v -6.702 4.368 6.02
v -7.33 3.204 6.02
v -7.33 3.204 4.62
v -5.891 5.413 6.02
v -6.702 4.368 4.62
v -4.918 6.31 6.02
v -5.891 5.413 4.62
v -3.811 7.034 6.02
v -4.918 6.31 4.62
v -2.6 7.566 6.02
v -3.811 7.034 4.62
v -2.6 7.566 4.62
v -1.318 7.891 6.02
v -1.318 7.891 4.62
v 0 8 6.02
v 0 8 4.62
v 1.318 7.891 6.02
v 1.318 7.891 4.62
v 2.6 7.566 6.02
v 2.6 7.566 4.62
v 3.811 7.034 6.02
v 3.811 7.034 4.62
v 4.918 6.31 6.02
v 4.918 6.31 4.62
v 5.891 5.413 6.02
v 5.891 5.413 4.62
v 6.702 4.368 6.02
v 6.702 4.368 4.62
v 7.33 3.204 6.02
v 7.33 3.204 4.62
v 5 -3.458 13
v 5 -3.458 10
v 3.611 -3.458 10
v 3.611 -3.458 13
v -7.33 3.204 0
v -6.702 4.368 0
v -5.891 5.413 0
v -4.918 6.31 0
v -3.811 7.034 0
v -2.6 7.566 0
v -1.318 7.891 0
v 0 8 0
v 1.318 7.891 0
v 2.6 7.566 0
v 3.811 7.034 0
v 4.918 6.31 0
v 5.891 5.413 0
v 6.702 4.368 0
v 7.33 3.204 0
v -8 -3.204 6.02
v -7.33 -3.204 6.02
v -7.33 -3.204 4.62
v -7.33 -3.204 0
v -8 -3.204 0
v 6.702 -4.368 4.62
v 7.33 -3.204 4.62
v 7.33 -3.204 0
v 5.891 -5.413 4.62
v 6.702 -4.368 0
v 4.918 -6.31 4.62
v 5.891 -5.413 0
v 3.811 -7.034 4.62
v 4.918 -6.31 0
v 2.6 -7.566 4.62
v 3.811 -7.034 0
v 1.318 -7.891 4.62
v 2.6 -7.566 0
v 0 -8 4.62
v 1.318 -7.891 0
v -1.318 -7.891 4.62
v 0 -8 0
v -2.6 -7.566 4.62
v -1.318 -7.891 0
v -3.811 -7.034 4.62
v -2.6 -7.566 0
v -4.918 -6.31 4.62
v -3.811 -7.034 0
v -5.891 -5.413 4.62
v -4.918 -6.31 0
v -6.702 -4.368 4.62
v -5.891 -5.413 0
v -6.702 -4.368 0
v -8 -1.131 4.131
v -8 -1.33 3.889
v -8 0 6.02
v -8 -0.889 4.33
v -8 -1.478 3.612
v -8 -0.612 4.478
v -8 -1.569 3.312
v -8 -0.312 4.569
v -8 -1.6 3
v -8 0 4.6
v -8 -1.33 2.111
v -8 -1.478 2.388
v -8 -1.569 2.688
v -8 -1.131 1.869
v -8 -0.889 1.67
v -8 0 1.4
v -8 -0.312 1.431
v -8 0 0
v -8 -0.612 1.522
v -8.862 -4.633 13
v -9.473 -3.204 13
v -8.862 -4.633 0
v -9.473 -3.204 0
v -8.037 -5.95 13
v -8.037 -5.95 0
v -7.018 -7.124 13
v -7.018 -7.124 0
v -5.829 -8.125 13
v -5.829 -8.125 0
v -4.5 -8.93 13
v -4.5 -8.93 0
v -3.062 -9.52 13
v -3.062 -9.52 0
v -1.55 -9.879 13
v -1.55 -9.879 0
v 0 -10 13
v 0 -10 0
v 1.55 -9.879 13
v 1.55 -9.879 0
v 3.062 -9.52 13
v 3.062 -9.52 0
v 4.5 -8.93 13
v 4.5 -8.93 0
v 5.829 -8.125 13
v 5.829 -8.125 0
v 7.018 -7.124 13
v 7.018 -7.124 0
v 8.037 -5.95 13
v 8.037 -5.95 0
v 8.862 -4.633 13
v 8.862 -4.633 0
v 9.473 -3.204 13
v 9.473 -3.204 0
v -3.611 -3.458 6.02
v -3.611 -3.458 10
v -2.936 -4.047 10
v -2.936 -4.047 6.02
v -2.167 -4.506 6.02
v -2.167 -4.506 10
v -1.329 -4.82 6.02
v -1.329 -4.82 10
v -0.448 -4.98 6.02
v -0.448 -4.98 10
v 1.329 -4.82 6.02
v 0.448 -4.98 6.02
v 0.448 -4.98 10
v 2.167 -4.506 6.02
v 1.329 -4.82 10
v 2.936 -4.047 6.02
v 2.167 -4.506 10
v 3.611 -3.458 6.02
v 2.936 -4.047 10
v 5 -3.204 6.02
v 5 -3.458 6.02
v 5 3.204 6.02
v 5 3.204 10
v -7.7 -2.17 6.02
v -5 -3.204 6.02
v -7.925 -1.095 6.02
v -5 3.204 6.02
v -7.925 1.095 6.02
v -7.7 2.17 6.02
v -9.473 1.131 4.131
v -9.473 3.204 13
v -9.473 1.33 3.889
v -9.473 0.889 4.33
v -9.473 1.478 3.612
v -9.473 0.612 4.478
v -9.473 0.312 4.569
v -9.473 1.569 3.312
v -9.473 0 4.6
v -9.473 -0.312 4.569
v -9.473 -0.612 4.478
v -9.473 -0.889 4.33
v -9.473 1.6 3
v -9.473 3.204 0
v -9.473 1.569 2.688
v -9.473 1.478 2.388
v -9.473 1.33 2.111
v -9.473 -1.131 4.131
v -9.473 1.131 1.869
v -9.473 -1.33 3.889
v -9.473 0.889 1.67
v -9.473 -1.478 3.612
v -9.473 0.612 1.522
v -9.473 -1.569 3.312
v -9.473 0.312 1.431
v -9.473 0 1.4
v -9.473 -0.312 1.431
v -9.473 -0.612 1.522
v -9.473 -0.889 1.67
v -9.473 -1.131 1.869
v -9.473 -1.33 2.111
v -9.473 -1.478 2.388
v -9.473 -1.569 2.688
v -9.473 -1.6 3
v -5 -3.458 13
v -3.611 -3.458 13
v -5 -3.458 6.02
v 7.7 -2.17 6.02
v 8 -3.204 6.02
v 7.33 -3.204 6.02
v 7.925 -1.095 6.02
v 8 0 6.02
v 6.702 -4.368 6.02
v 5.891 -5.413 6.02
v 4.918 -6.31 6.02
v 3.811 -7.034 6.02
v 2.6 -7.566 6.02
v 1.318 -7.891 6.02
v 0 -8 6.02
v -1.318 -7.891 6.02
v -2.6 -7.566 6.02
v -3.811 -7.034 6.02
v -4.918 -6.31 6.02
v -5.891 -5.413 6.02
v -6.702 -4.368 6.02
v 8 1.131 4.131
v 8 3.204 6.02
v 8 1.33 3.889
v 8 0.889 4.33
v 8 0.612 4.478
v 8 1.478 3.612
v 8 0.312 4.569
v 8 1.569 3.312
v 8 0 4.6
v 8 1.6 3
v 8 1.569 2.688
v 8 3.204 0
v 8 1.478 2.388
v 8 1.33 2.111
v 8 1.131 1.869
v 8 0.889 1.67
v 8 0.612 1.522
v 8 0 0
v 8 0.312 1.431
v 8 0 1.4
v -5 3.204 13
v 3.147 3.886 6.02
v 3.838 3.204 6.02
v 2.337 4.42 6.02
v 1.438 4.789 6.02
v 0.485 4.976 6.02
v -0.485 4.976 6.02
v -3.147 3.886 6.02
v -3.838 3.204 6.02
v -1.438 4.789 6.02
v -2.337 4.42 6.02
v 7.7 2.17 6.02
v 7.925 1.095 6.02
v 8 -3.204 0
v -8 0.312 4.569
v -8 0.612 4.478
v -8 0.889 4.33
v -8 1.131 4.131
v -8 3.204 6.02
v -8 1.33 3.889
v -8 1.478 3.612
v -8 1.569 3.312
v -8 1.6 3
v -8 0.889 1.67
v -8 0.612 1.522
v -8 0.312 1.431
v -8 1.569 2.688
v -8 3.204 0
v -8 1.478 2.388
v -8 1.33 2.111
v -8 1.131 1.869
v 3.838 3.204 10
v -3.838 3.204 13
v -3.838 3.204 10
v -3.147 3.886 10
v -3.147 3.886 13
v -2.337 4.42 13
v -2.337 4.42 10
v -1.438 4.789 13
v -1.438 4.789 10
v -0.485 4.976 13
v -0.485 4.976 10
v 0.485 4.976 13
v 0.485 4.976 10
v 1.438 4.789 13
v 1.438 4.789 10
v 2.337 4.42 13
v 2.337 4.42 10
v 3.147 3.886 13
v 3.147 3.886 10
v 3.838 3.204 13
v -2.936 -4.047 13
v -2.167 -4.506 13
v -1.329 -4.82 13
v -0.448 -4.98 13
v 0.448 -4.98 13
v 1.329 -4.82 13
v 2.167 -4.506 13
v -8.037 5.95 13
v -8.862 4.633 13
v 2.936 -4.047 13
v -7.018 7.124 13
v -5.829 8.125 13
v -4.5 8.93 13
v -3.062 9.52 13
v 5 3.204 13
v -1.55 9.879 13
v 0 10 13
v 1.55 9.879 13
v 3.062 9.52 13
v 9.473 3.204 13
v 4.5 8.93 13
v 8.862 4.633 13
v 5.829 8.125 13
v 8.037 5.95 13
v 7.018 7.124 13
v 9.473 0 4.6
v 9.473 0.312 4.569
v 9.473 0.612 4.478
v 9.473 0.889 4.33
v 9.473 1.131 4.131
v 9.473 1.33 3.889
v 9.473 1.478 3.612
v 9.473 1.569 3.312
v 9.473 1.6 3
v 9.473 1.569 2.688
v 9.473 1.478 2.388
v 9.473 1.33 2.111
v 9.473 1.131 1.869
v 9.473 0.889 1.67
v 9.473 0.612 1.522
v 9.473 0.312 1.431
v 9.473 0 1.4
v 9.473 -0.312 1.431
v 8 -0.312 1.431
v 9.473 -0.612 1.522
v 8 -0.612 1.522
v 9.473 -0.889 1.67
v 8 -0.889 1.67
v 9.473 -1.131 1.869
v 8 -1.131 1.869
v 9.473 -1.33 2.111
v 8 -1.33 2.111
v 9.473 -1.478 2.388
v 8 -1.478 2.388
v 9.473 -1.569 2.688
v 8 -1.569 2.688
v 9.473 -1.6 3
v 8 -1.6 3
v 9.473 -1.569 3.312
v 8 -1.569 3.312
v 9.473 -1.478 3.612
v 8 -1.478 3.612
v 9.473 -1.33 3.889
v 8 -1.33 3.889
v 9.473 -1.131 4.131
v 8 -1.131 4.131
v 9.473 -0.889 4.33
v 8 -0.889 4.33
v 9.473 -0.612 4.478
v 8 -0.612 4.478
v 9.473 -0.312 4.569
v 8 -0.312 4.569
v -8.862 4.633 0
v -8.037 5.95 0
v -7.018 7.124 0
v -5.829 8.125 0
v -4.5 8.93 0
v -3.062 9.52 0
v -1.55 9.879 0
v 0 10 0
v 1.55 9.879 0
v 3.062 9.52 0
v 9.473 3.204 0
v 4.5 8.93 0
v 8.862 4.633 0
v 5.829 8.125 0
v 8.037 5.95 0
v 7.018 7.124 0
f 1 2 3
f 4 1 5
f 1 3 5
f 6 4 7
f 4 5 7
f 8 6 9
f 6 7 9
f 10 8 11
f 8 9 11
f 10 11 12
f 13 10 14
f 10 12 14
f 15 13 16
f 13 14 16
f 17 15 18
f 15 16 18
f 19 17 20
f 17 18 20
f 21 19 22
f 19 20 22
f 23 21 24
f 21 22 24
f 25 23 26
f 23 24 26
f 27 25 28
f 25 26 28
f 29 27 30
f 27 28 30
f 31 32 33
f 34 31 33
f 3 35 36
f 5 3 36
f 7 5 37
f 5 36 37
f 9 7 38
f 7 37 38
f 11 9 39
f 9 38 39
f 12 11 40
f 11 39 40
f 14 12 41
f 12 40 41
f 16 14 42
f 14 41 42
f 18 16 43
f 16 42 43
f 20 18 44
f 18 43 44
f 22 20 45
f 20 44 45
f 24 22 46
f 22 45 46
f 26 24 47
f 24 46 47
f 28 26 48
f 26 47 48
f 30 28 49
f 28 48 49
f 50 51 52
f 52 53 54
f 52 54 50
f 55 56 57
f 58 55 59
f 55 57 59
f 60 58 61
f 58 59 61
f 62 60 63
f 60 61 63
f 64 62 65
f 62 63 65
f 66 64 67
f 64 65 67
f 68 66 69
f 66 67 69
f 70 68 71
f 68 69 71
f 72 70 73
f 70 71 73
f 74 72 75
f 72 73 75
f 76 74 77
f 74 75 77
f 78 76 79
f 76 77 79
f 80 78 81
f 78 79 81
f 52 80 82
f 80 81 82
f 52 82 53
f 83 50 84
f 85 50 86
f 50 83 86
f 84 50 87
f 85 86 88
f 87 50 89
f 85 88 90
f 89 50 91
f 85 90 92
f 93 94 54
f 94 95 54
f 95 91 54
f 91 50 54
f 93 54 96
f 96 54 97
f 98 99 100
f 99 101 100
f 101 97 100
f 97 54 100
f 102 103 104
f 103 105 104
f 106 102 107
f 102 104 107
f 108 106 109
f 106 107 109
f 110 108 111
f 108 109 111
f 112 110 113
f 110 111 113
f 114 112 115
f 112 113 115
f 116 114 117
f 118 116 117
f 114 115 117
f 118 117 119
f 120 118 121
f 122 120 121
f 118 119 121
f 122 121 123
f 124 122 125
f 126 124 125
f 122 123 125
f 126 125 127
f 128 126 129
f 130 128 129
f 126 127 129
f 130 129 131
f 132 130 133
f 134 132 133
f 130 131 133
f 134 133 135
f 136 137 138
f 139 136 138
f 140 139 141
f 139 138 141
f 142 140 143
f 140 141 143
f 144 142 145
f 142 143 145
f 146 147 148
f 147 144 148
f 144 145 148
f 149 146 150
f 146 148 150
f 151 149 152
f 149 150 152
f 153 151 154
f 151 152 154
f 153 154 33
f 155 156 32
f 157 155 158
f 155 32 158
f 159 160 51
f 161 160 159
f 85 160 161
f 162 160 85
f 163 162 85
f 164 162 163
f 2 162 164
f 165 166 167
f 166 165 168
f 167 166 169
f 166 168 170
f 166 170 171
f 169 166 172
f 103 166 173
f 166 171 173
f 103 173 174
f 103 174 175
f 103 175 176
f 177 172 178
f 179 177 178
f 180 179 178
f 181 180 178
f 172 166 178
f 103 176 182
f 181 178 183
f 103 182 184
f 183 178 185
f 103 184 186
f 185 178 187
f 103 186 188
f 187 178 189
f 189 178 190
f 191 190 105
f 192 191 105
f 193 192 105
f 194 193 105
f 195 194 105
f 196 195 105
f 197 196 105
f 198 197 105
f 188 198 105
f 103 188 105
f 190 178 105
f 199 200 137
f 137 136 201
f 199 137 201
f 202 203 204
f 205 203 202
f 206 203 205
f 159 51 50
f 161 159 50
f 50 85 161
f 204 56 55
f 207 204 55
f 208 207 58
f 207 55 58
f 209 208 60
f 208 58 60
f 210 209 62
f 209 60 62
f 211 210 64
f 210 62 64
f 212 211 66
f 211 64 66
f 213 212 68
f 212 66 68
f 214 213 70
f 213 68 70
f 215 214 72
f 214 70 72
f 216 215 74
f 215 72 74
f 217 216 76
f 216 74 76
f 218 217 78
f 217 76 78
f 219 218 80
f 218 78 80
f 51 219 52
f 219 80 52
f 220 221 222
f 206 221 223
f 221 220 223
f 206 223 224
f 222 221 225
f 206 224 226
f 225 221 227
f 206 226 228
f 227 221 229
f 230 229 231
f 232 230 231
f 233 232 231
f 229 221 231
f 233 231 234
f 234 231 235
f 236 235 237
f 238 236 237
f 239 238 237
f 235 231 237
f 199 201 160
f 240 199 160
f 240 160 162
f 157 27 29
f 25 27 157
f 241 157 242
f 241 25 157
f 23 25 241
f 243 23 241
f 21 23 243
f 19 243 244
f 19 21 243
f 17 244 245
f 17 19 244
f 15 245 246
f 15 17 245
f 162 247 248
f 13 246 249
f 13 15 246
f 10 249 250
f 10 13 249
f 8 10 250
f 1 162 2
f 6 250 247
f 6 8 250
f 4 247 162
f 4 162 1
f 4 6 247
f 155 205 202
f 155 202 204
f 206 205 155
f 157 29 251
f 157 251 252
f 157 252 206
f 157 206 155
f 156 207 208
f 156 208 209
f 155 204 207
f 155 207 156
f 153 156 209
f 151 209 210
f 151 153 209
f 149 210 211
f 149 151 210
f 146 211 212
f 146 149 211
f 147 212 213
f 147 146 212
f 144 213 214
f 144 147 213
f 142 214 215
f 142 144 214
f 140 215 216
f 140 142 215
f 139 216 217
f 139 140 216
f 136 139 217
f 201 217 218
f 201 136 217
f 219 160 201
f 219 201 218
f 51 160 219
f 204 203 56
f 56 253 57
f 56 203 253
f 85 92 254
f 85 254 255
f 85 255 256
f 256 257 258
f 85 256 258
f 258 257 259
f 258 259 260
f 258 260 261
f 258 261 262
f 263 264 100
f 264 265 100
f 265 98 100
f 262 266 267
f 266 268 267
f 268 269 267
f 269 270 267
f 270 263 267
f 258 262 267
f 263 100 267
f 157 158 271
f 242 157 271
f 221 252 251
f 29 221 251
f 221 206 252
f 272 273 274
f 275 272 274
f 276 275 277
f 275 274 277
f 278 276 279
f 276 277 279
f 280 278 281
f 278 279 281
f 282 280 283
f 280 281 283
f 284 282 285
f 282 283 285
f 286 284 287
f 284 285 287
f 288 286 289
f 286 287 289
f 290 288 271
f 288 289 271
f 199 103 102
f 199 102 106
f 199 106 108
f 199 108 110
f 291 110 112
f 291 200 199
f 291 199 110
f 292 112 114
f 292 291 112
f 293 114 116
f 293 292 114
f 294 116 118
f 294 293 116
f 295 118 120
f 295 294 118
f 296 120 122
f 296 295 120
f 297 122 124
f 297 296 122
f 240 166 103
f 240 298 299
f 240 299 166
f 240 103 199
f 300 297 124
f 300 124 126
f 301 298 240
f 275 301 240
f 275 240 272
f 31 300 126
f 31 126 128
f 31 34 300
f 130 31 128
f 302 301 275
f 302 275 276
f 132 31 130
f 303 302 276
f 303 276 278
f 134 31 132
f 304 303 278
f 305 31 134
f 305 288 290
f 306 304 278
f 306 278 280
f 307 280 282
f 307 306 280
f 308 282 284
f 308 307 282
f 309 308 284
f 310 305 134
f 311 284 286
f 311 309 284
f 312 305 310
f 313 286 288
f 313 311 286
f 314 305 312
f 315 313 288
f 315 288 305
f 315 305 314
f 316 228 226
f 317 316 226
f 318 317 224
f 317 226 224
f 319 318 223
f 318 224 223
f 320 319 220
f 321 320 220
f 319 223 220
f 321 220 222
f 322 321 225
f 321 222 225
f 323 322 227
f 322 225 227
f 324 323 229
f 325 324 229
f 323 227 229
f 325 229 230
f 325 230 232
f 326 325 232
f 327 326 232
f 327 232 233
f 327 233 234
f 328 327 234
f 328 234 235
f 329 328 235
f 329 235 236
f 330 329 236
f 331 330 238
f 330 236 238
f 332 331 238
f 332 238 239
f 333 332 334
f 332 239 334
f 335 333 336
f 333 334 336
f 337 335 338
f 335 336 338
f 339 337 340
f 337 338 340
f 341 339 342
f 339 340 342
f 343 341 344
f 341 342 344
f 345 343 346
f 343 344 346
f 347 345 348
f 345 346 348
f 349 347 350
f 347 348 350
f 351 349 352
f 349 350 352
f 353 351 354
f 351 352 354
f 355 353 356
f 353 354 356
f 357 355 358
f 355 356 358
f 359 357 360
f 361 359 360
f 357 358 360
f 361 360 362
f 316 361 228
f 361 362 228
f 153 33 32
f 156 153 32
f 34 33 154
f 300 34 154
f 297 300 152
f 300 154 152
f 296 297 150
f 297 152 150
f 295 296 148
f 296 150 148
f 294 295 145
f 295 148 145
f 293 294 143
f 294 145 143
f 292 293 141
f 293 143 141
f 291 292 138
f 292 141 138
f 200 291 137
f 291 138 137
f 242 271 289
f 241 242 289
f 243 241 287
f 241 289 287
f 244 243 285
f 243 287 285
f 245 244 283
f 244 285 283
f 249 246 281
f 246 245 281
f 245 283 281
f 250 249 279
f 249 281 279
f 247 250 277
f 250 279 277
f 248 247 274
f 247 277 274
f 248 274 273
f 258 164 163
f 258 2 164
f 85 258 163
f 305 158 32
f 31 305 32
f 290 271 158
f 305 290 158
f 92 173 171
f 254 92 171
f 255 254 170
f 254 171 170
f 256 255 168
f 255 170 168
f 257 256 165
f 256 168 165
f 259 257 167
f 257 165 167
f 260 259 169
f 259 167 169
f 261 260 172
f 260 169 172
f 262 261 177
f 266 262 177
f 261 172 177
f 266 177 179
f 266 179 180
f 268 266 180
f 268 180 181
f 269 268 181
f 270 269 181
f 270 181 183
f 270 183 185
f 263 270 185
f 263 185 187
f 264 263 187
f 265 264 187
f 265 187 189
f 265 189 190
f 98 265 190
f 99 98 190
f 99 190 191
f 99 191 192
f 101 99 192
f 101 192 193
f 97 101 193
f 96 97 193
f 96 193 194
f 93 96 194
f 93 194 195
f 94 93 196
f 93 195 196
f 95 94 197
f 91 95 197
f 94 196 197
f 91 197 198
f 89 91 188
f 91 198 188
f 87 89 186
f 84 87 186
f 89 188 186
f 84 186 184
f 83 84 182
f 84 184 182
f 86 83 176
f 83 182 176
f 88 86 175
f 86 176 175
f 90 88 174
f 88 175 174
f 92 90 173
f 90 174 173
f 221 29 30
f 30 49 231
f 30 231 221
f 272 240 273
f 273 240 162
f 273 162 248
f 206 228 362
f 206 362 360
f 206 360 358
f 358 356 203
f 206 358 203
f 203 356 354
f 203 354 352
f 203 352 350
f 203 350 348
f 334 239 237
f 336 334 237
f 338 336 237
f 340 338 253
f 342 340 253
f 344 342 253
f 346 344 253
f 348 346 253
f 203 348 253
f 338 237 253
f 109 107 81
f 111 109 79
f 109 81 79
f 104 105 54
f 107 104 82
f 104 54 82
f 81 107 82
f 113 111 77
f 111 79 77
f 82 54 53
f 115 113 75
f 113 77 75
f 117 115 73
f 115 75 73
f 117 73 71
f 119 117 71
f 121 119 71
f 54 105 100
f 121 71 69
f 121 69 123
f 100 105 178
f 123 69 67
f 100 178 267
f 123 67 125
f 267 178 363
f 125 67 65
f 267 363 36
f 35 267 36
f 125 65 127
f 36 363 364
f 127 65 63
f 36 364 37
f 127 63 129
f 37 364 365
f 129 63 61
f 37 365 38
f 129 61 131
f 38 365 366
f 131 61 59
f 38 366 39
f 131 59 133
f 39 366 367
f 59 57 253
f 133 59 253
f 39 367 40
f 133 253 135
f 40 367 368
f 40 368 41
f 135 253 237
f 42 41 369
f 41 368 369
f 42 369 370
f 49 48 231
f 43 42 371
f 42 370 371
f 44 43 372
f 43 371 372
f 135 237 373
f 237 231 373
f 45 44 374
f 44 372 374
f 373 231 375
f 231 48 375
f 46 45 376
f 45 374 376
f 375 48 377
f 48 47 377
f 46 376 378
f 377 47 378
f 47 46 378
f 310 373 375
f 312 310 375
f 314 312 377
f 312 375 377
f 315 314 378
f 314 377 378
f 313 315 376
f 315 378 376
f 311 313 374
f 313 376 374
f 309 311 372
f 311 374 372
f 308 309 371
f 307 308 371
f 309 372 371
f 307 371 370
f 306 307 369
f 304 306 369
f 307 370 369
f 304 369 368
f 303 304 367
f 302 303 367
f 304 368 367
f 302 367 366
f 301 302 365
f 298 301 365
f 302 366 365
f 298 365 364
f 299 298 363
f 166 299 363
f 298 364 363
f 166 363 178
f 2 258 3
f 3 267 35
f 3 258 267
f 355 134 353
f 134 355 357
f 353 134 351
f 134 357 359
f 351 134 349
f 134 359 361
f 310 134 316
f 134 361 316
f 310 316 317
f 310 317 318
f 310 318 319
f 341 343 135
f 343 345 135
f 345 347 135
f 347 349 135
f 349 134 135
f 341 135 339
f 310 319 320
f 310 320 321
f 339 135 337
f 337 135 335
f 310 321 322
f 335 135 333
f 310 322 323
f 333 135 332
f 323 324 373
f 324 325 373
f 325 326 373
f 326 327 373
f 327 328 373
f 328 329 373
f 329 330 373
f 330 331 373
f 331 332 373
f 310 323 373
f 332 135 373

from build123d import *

# Parameters (mm, degrees)
EXTRUDE_2_DEPTH      = 10
SKETCH_5_R           = 1.6
CUT_EXTRUDE_1_DEPTH  = 27
SKETCH_8_R           = 8
EXTRUDE_4_DEPTH      = 10
SKETCH_8_3_R         = 8
CUT_EXTRUDE_4_DEPTH  = 4.62
SKETCH_10_R          = 5
CUT_EXTRUDE_6_DEPTH  = 33.62
CUT_EXTRUDE_7_DEPTH  = 33.62
EXTRUDE_5_DEPTH      = 3
SKETCH_13_R          = 8
CUT_EXTRUDE_8_DEPTH  = 1.4
CUT_EXTRUDE_10_DEPTH = 6.02


with BuildPart() as part:
    # 草图4 → 凸台-拉伸2 (new body)
    with BuildSketch(Plane.XY):
        with BuildLine():
            Line((-9.472780877, 3.204125849), (-7.330319061, 3.204125849))
            ThreePointArc((-7.330319061, 3.204125849), (0, 8), (7.330319061, 3.204125849))
            Line((7.330319061, 3.204125849), (9.472780877, 3.204125849))
            ThreePointArc((9.472780877, 3.204125849), (0, 10), (-9.472780877, 3.204125849))
        make_face()
        with BuildLine():
            Line((9.472780877, 3.204125849), (7.330319061, 3.204125849))
            ThreePointArc((7.330319061, 3.204125849), (7.83079027, 1.636680712), (8, 0))
            ThreePointArc((8, 0), (7.83079027, -1.636680712), (7.330319061, -3.204125849))
            Line((7.330319061, -3.204125849), (9.472780877, -3.204125849))
            Line((9.472780877, -3.204125849), (9.472780877, 3.204125849))
        make_face()
        with BuildLine():
            ThreePointArc((7.330319061, -3.204125849), (0, -8), (-7.330319061, -3.204125849))
            Line((-7.330319061, -3.204125849), (-9.472780877, -3.204125849))
            ThreePointArc((-9.472780877, -3.204125849), (0, -10), (9.472780877, -3.204125849))
            Line((9.472780877, -3.204125849), (7.330319061, -3.204125849))
        make_face()
        with BuildLine():
            ThreePointArc((-7.330319061, -3.204125849), (-8, 0), (-7.330319061, 3.204125849))
            Line((-7.330319061, 3.204125849), (-9.472780877, 3.204125849))
            Line((-9.472780877, 3.204125849), (-9.472780877, -3.204125849))
            Line((-9.472780877, -3.204125849), (-7.330319061, -3.204125849))
        make_face()
    extrude(amount=EXTRUDE_2_DEPTH)

    # 草图5 → 切除-拉伸1 (cut)
    with BuildSketch(Plane.ZY.offset(9.472780877)):
        with Locations((3, 0)):
            Circle(SKETCH_5_R)
    extrude(amount=-CUT_EXTRUDE_1_DEPTH, mode=Mode.SUBTRACT)

    # 草图8 → 凸台-拉伸4 (add)
    with BuildSketch(Plane(origin=(0, 0, 0), x_dir=(-1, 0, 0), z_dir=(0, 0, -1))):
        Circle(SKETCH_8_R)
    extrude(amount=-EXTRUDE_4_DEPTH)

    # 草图8<3> → 切除-拉伸4 (cut)
    with BuildSketch(Plane(origin=(0, 0, 0), x_dir=(-1, 0, 0), z_dir=(0, 0, -1))):
        Circle(SKETCH_8_3_R)
    extrude(amount=-CUT_EXTRUDE_4_DEPTH, mode=Mode.SUBTRACT)

    # 草图10 → 切除-拉伸6 (cut)
    with BuildSketch(Plane.XY.offset(10)):
        Circle(SKETCH_10_R)
    extrude(amount=-CUT_EXTRUDE_6_DEPTH, mode=Mode.SUBTRACT)

    # 草图11 → 切除-拉伸7 (cut)
    with BuildSketch(Plane.XY.offset(10)):
        with BuildLine():
            ThreePointArc((5, 0), (4.639856446, -1.863258479), (3.611307136, -3.458100746))
            Line((3.611307136, -3.458100746), (5, -3.458100746))
            Line((5, -3.458100746), (5, 0))
        make_face()
        with BuildLine():
            Line((5, 3.204125849), (3.838434257, 3.204125849))
            ThreePointArc((3.838434257, 3.204125849), (4.700647364, 1.704087544), (5, 0))
            Line((5, 0), (5, 3.204125849))
        make_face()
        with BuildLine():
            Line((-3.838434257, 3.204125849), (-5, 3.204125849))
            Line((-5, 3.204125849), (-5, 0))
            ThreePointArc((-5, 0), (-4.700647364, 1.704087544), (-3.838434257, 3.204125849))
        make_face()
        with BuildLine():
            ThreePointArc((-3.611307136, -3.458100746), (-4.639856446, -1.863258479), (-5, 0))
            Line((-5, 0), (-5, -3.458100746))
            Line((-5, -3.458100746), (-3.611307136, -3.458100746))
        make_face()
    extrude(amount=-CUT_EXTRUDE_7_DEPTH, mode=Mode.SUBTRACT)

    # 草图14 → 凸台-拉伸5 (add)
    with BuildSketch(Plane.XY.offset(10)):
        with BuildLine():
            Line((-9.472780877, 3.204125849), (-9.472780877, -3.204125849))
            ThreePointArc((-9.472780877, -3.204125849), (0, -10), (9.472780877, -3.204125849))
            Line((9.472780877, -3.204125849), (9.472780877, 3.204125849))
            ThreePointArc((9.472780877, 3.204125849), (0, 10), (-9.472780877, 3.204125849))
        make_face()
        with BuildLine():
            ThreePointArc((-3.838434257, 3.204125849), (0, 5), (3.838434257, 3.204125849))
            Line((3.838434257, 3.204125849), (5, 3.204125849))
            Line((5, 3.204125849), (5, -3.458100746))
            Line((5, -3.458100746), (3.611307136, -3.458100746))
            ThreePointArc((3.611307136, -3.458100746), (0, -5), (-3.611307136, -3.458100746))
            Line((-3.611307136, -3.458100746), (-5, -3.458100746))
            Line((-5, -3.458100746), (-5, 3.204125849))
            Line((-5, 3.204125849), (-3.838434257, 3.204125849))
        make_face(mode=Mode.SUBTRACT)
    extrude(amount=EXTRUDE_5_DEPTH)

    # 草图13 → 切除-拉伸8 (cut)
    with BuildSketch(Plane(origin=(0, 0, 4.62), x_dir=(-1, 0, 0), z_dir=(0, 0, -1))):
        Circle(SKETCH_13_R)
        with BuildLine():
            Line((-5, -3.458100746), (-3.611307136, -3.458100746))
            ThreePointArc((-3.611307136, -3.458100746), (0, -5), (3.611307136, -3.458100746))
            Line((3.611307136, -3.458100746), (5, -3.458100746))
            Line((5, -3.458100746), (5, 3.204125849))
            Line((5, 3.204125849), (3.838434257, 3.204125849))
            ThreePointArc((3.838434257, 3.204125849), (0, 5), (-3.838434257, 3.204125849))
            Line((-3.838434257, 3.204125849), (-5, 3.204125849))
            Line((-5, 3.204125849), (-5, -3.458100746))
        make_face(mode=Mode.SUBTRACT)
    extrude(amount=-CUT_EXTRUDE_8_DEPTH, mode=Mode.SUBTRACT)

    # 草图15 → 切除-拉伸10 (cut)
    with BuildSketch(Plane(origin=(0, 0, 0), x_dir=(-1, 0, 0), z_dir=(0, 0, -1))):
        Polygon((-8, 3.204125849), (-8, -3.204125849), (8, -3.204125849), (8, 3.204125849), (-7.888349605, 3.204125849), align=None)
    extrude(amount=-CUT_EXTRUDE_10_DEPTH, mode=Mode.SUBTRACT)


solid = part.part
